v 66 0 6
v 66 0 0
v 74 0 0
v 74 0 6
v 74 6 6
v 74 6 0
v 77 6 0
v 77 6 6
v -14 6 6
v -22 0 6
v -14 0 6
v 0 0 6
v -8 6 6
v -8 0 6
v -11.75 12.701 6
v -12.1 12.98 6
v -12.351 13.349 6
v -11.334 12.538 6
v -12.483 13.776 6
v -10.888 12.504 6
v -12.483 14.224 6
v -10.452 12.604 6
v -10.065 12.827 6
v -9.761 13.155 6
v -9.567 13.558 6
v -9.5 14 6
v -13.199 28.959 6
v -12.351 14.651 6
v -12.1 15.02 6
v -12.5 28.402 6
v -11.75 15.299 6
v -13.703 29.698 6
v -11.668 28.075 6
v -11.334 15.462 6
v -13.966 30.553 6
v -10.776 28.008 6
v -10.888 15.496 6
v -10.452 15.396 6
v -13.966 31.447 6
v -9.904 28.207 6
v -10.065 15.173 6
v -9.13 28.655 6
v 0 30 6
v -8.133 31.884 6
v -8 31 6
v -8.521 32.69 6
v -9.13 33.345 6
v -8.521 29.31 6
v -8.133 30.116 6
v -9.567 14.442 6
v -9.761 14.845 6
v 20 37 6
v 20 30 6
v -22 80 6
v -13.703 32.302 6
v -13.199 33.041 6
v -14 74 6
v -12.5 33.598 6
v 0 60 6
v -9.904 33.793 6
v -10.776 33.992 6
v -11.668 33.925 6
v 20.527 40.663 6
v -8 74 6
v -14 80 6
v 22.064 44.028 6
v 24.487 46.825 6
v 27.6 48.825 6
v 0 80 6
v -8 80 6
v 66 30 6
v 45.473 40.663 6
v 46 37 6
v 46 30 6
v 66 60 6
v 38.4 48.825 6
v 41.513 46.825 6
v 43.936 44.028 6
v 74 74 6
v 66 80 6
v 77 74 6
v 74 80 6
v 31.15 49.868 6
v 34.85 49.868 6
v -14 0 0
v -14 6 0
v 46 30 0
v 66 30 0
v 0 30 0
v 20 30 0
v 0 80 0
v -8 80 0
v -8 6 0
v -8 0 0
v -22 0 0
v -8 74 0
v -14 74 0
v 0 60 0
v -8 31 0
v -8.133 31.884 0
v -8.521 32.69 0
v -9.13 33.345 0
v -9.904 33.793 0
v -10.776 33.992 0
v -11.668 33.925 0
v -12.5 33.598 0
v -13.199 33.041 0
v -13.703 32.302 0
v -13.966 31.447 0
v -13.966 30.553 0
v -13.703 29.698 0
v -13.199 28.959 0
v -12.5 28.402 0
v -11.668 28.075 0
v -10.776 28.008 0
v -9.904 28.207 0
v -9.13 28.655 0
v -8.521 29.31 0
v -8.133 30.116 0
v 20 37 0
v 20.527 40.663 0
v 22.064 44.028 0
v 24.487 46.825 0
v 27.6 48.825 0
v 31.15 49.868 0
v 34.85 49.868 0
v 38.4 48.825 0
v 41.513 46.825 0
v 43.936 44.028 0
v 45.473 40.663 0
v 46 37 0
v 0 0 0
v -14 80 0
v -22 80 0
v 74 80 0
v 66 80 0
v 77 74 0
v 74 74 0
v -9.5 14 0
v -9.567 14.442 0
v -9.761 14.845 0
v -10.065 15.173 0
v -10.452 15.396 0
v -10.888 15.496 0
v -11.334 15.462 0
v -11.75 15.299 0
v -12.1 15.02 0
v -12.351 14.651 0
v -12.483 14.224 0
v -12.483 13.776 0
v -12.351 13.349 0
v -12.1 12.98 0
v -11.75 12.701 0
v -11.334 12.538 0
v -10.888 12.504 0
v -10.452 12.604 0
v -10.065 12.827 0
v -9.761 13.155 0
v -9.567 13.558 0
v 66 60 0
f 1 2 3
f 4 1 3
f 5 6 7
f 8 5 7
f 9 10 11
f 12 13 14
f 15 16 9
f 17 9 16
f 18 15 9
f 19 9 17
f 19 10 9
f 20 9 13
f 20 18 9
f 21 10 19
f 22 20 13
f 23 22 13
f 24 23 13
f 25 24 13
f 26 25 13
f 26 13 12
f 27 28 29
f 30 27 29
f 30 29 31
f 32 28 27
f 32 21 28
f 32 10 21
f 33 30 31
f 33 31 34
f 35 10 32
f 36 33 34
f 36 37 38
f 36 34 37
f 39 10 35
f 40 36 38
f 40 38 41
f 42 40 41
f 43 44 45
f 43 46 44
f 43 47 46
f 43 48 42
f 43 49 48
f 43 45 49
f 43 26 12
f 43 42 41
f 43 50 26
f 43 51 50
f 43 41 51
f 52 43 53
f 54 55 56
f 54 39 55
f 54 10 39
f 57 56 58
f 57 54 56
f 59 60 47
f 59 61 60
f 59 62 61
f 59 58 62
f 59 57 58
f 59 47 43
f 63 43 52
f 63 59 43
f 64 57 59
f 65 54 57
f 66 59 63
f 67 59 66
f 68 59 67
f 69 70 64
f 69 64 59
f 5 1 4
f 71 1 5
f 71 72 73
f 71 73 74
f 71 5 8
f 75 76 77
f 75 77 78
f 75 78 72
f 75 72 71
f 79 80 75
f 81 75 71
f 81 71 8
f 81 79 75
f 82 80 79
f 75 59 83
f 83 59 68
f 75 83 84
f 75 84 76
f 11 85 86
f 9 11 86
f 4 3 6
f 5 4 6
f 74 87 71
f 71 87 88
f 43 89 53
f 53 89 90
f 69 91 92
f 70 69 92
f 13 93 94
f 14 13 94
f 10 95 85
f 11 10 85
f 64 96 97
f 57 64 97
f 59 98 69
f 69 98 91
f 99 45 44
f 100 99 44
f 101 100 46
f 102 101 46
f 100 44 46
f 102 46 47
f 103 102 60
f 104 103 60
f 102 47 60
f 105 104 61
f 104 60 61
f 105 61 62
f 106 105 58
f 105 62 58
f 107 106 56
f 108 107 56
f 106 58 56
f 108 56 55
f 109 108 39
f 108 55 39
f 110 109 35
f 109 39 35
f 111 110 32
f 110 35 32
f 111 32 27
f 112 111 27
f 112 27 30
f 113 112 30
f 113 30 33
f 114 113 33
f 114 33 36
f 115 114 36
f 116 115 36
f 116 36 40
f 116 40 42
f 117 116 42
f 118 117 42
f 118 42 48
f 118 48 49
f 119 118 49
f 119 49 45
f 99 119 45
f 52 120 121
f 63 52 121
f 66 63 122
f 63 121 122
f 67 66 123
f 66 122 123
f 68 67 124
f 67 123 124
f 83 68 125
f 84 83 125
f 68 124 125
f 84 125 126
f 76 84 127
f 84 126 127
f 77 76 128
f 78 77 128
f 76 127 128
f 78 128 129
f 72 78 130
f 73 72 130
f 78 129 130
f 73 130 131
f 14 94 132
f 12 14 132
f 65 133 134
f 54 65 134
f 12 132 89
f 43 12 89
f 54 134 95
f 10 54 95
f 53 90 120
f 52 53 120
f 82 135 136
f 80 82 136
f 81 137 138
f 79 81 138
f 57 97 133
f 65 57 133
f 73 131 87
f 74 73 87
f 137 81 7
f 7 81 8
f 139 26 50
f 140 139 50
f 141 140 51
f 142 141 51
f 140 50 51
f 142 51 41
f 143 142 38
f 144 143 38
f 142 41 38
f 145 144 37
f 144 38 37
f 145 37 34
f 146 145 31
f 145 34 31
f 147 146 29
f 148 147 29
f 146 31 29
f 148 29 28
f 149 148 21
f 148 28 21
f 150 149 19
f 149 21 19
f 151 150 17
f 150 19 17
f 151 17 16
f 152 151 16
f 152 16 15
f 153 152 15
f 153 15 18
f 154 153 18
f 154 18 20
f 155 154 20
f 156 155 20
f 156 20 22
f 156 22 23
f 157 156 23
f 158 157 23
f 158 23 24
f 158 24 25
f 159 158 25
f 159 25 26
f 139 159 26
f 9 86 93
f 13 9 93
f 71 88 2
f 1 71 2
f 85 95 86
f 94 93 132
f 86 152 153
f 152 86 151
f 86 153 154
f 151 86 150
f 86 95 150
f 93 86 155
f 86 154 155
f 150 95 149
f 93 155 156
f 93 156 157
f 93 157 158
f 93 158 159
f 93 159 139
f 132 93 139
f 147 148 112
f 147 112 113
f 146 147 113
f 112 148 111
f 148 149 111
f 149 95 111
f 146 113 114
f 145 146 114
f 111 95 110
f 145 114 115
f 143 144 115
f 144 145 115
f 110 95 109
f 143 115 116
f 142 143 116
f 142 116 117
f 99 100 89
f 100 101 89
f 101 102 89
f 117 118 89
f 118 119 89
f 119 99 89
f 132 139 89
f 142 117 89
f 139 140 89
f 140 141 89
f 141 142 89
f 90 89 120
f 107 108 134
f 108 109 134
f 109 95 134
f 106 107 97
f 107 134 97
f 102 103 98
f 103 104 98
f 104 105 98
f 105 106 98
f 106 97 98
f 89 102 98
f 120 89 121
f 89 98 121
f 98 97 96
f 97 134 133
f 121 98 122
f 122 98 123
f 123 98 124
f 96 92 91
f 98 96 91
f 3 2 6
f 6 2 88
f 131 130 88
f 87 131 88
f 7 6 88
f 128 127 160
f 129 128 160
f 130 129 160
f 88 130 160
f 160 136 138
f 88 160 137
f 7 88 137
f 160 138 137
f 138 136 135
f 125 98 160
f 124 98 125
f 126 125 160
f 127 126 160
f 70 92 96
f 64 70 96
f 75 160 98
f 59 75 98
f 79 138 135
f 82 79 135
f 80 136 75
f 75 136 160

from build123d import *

# Parameters (mm, degrees)
BOSS_EXTRU_1_DEPTH      = 6
ESQUISSE2_R             = 3
ESQUISSE2_R_2           = 1.5
ENL_V_MAT_EXTRU_1_DEPTH = 30
ENL_V_MAT_EXTRU_3_DEPTH = 10


with BuildPart() as part:
    # Esquisse1 → Boss.-Extru.1 (new body)
    with BuildSketch(Plane.XY):
        with BuildLine():
            Line((-14, 74), (-14, 80))
            Line((-14, 80), (-22, 80))
            Line((-22, 80), (-22, 0))
            Line((-22, 0), (-14, 0))
            Line((-14, 0), (-14, 6))
            Line((-14, 6), (-8, 6))
            Line((-8, 6), (-8, 0))
            Line((-8, 0), (0, 0))
            Line((0, 0), (0, 30))
            Line((0, 30), (20, 30))
            Line((20, 30), (20, 37))
            ThreePointArc((20, 37), (33, 50), (46, 37))
            Line((46, 37), (46, 30))
            Line((46, 30), (66, 30))
            Line((66, 30), (66, 0))
            Line((66, 0), (74, 0))
            Line((74, 0), (74, 6))
            Line((74, 6), (80, 6))
            Line((80, 6), (80, 0))
            Line((80, 0), (88, 0))
            Line((88, 0), (88, 80))
            Line((88, 80), (80, 80))
            Line((80, 80), (80, 74))
            Line((80, 74), (74, 74))
            Line((74, 74), (74, 80))
            Line((74, 80), (66, 80))
            Line((66, 80), (66, 60))
            Line((66, 60), (0, 60))
            Line((0, 60), (0, 80))
            Line((0, 80), (-8, 80))
            Line((-8, 80), (-8, 74))
            Line((-8, 74), (-14, 74))
        make_face()
    extrude(amount=BOSS_EXTRU_1_DEPTH)

    # Esquisse2 → Enlèv. mat.-Extru.1 (cut)
    with BuildSketch(Plane.XY.offset(6)):
        with Locations((-11, 31)):
            Circle(ESQUISSE2_R)
        with Locations((-11, 14)):
            Circle(ESQUISSE2_R_2)
    extrude(amount=-ENL_V_MAT_EXTRU_1_DEPTH, mode=Mode.SUBTRACT)

    # Esquisse5 → Enlèv. mat.-Extru.3 (cut)
    with BuildSketch(Plane.XY.offset(6)):
        Polygon((77, 74), (77, 6), (80, 6), (80, 0), (88, 0), (88, 80), (80, 80), (80, 74), align=None)
    extrude(amount=-ENL_V_MAT_EXTRU_3_DEPTH, mode=Mode.SUBTRACT)


solid = part.part
